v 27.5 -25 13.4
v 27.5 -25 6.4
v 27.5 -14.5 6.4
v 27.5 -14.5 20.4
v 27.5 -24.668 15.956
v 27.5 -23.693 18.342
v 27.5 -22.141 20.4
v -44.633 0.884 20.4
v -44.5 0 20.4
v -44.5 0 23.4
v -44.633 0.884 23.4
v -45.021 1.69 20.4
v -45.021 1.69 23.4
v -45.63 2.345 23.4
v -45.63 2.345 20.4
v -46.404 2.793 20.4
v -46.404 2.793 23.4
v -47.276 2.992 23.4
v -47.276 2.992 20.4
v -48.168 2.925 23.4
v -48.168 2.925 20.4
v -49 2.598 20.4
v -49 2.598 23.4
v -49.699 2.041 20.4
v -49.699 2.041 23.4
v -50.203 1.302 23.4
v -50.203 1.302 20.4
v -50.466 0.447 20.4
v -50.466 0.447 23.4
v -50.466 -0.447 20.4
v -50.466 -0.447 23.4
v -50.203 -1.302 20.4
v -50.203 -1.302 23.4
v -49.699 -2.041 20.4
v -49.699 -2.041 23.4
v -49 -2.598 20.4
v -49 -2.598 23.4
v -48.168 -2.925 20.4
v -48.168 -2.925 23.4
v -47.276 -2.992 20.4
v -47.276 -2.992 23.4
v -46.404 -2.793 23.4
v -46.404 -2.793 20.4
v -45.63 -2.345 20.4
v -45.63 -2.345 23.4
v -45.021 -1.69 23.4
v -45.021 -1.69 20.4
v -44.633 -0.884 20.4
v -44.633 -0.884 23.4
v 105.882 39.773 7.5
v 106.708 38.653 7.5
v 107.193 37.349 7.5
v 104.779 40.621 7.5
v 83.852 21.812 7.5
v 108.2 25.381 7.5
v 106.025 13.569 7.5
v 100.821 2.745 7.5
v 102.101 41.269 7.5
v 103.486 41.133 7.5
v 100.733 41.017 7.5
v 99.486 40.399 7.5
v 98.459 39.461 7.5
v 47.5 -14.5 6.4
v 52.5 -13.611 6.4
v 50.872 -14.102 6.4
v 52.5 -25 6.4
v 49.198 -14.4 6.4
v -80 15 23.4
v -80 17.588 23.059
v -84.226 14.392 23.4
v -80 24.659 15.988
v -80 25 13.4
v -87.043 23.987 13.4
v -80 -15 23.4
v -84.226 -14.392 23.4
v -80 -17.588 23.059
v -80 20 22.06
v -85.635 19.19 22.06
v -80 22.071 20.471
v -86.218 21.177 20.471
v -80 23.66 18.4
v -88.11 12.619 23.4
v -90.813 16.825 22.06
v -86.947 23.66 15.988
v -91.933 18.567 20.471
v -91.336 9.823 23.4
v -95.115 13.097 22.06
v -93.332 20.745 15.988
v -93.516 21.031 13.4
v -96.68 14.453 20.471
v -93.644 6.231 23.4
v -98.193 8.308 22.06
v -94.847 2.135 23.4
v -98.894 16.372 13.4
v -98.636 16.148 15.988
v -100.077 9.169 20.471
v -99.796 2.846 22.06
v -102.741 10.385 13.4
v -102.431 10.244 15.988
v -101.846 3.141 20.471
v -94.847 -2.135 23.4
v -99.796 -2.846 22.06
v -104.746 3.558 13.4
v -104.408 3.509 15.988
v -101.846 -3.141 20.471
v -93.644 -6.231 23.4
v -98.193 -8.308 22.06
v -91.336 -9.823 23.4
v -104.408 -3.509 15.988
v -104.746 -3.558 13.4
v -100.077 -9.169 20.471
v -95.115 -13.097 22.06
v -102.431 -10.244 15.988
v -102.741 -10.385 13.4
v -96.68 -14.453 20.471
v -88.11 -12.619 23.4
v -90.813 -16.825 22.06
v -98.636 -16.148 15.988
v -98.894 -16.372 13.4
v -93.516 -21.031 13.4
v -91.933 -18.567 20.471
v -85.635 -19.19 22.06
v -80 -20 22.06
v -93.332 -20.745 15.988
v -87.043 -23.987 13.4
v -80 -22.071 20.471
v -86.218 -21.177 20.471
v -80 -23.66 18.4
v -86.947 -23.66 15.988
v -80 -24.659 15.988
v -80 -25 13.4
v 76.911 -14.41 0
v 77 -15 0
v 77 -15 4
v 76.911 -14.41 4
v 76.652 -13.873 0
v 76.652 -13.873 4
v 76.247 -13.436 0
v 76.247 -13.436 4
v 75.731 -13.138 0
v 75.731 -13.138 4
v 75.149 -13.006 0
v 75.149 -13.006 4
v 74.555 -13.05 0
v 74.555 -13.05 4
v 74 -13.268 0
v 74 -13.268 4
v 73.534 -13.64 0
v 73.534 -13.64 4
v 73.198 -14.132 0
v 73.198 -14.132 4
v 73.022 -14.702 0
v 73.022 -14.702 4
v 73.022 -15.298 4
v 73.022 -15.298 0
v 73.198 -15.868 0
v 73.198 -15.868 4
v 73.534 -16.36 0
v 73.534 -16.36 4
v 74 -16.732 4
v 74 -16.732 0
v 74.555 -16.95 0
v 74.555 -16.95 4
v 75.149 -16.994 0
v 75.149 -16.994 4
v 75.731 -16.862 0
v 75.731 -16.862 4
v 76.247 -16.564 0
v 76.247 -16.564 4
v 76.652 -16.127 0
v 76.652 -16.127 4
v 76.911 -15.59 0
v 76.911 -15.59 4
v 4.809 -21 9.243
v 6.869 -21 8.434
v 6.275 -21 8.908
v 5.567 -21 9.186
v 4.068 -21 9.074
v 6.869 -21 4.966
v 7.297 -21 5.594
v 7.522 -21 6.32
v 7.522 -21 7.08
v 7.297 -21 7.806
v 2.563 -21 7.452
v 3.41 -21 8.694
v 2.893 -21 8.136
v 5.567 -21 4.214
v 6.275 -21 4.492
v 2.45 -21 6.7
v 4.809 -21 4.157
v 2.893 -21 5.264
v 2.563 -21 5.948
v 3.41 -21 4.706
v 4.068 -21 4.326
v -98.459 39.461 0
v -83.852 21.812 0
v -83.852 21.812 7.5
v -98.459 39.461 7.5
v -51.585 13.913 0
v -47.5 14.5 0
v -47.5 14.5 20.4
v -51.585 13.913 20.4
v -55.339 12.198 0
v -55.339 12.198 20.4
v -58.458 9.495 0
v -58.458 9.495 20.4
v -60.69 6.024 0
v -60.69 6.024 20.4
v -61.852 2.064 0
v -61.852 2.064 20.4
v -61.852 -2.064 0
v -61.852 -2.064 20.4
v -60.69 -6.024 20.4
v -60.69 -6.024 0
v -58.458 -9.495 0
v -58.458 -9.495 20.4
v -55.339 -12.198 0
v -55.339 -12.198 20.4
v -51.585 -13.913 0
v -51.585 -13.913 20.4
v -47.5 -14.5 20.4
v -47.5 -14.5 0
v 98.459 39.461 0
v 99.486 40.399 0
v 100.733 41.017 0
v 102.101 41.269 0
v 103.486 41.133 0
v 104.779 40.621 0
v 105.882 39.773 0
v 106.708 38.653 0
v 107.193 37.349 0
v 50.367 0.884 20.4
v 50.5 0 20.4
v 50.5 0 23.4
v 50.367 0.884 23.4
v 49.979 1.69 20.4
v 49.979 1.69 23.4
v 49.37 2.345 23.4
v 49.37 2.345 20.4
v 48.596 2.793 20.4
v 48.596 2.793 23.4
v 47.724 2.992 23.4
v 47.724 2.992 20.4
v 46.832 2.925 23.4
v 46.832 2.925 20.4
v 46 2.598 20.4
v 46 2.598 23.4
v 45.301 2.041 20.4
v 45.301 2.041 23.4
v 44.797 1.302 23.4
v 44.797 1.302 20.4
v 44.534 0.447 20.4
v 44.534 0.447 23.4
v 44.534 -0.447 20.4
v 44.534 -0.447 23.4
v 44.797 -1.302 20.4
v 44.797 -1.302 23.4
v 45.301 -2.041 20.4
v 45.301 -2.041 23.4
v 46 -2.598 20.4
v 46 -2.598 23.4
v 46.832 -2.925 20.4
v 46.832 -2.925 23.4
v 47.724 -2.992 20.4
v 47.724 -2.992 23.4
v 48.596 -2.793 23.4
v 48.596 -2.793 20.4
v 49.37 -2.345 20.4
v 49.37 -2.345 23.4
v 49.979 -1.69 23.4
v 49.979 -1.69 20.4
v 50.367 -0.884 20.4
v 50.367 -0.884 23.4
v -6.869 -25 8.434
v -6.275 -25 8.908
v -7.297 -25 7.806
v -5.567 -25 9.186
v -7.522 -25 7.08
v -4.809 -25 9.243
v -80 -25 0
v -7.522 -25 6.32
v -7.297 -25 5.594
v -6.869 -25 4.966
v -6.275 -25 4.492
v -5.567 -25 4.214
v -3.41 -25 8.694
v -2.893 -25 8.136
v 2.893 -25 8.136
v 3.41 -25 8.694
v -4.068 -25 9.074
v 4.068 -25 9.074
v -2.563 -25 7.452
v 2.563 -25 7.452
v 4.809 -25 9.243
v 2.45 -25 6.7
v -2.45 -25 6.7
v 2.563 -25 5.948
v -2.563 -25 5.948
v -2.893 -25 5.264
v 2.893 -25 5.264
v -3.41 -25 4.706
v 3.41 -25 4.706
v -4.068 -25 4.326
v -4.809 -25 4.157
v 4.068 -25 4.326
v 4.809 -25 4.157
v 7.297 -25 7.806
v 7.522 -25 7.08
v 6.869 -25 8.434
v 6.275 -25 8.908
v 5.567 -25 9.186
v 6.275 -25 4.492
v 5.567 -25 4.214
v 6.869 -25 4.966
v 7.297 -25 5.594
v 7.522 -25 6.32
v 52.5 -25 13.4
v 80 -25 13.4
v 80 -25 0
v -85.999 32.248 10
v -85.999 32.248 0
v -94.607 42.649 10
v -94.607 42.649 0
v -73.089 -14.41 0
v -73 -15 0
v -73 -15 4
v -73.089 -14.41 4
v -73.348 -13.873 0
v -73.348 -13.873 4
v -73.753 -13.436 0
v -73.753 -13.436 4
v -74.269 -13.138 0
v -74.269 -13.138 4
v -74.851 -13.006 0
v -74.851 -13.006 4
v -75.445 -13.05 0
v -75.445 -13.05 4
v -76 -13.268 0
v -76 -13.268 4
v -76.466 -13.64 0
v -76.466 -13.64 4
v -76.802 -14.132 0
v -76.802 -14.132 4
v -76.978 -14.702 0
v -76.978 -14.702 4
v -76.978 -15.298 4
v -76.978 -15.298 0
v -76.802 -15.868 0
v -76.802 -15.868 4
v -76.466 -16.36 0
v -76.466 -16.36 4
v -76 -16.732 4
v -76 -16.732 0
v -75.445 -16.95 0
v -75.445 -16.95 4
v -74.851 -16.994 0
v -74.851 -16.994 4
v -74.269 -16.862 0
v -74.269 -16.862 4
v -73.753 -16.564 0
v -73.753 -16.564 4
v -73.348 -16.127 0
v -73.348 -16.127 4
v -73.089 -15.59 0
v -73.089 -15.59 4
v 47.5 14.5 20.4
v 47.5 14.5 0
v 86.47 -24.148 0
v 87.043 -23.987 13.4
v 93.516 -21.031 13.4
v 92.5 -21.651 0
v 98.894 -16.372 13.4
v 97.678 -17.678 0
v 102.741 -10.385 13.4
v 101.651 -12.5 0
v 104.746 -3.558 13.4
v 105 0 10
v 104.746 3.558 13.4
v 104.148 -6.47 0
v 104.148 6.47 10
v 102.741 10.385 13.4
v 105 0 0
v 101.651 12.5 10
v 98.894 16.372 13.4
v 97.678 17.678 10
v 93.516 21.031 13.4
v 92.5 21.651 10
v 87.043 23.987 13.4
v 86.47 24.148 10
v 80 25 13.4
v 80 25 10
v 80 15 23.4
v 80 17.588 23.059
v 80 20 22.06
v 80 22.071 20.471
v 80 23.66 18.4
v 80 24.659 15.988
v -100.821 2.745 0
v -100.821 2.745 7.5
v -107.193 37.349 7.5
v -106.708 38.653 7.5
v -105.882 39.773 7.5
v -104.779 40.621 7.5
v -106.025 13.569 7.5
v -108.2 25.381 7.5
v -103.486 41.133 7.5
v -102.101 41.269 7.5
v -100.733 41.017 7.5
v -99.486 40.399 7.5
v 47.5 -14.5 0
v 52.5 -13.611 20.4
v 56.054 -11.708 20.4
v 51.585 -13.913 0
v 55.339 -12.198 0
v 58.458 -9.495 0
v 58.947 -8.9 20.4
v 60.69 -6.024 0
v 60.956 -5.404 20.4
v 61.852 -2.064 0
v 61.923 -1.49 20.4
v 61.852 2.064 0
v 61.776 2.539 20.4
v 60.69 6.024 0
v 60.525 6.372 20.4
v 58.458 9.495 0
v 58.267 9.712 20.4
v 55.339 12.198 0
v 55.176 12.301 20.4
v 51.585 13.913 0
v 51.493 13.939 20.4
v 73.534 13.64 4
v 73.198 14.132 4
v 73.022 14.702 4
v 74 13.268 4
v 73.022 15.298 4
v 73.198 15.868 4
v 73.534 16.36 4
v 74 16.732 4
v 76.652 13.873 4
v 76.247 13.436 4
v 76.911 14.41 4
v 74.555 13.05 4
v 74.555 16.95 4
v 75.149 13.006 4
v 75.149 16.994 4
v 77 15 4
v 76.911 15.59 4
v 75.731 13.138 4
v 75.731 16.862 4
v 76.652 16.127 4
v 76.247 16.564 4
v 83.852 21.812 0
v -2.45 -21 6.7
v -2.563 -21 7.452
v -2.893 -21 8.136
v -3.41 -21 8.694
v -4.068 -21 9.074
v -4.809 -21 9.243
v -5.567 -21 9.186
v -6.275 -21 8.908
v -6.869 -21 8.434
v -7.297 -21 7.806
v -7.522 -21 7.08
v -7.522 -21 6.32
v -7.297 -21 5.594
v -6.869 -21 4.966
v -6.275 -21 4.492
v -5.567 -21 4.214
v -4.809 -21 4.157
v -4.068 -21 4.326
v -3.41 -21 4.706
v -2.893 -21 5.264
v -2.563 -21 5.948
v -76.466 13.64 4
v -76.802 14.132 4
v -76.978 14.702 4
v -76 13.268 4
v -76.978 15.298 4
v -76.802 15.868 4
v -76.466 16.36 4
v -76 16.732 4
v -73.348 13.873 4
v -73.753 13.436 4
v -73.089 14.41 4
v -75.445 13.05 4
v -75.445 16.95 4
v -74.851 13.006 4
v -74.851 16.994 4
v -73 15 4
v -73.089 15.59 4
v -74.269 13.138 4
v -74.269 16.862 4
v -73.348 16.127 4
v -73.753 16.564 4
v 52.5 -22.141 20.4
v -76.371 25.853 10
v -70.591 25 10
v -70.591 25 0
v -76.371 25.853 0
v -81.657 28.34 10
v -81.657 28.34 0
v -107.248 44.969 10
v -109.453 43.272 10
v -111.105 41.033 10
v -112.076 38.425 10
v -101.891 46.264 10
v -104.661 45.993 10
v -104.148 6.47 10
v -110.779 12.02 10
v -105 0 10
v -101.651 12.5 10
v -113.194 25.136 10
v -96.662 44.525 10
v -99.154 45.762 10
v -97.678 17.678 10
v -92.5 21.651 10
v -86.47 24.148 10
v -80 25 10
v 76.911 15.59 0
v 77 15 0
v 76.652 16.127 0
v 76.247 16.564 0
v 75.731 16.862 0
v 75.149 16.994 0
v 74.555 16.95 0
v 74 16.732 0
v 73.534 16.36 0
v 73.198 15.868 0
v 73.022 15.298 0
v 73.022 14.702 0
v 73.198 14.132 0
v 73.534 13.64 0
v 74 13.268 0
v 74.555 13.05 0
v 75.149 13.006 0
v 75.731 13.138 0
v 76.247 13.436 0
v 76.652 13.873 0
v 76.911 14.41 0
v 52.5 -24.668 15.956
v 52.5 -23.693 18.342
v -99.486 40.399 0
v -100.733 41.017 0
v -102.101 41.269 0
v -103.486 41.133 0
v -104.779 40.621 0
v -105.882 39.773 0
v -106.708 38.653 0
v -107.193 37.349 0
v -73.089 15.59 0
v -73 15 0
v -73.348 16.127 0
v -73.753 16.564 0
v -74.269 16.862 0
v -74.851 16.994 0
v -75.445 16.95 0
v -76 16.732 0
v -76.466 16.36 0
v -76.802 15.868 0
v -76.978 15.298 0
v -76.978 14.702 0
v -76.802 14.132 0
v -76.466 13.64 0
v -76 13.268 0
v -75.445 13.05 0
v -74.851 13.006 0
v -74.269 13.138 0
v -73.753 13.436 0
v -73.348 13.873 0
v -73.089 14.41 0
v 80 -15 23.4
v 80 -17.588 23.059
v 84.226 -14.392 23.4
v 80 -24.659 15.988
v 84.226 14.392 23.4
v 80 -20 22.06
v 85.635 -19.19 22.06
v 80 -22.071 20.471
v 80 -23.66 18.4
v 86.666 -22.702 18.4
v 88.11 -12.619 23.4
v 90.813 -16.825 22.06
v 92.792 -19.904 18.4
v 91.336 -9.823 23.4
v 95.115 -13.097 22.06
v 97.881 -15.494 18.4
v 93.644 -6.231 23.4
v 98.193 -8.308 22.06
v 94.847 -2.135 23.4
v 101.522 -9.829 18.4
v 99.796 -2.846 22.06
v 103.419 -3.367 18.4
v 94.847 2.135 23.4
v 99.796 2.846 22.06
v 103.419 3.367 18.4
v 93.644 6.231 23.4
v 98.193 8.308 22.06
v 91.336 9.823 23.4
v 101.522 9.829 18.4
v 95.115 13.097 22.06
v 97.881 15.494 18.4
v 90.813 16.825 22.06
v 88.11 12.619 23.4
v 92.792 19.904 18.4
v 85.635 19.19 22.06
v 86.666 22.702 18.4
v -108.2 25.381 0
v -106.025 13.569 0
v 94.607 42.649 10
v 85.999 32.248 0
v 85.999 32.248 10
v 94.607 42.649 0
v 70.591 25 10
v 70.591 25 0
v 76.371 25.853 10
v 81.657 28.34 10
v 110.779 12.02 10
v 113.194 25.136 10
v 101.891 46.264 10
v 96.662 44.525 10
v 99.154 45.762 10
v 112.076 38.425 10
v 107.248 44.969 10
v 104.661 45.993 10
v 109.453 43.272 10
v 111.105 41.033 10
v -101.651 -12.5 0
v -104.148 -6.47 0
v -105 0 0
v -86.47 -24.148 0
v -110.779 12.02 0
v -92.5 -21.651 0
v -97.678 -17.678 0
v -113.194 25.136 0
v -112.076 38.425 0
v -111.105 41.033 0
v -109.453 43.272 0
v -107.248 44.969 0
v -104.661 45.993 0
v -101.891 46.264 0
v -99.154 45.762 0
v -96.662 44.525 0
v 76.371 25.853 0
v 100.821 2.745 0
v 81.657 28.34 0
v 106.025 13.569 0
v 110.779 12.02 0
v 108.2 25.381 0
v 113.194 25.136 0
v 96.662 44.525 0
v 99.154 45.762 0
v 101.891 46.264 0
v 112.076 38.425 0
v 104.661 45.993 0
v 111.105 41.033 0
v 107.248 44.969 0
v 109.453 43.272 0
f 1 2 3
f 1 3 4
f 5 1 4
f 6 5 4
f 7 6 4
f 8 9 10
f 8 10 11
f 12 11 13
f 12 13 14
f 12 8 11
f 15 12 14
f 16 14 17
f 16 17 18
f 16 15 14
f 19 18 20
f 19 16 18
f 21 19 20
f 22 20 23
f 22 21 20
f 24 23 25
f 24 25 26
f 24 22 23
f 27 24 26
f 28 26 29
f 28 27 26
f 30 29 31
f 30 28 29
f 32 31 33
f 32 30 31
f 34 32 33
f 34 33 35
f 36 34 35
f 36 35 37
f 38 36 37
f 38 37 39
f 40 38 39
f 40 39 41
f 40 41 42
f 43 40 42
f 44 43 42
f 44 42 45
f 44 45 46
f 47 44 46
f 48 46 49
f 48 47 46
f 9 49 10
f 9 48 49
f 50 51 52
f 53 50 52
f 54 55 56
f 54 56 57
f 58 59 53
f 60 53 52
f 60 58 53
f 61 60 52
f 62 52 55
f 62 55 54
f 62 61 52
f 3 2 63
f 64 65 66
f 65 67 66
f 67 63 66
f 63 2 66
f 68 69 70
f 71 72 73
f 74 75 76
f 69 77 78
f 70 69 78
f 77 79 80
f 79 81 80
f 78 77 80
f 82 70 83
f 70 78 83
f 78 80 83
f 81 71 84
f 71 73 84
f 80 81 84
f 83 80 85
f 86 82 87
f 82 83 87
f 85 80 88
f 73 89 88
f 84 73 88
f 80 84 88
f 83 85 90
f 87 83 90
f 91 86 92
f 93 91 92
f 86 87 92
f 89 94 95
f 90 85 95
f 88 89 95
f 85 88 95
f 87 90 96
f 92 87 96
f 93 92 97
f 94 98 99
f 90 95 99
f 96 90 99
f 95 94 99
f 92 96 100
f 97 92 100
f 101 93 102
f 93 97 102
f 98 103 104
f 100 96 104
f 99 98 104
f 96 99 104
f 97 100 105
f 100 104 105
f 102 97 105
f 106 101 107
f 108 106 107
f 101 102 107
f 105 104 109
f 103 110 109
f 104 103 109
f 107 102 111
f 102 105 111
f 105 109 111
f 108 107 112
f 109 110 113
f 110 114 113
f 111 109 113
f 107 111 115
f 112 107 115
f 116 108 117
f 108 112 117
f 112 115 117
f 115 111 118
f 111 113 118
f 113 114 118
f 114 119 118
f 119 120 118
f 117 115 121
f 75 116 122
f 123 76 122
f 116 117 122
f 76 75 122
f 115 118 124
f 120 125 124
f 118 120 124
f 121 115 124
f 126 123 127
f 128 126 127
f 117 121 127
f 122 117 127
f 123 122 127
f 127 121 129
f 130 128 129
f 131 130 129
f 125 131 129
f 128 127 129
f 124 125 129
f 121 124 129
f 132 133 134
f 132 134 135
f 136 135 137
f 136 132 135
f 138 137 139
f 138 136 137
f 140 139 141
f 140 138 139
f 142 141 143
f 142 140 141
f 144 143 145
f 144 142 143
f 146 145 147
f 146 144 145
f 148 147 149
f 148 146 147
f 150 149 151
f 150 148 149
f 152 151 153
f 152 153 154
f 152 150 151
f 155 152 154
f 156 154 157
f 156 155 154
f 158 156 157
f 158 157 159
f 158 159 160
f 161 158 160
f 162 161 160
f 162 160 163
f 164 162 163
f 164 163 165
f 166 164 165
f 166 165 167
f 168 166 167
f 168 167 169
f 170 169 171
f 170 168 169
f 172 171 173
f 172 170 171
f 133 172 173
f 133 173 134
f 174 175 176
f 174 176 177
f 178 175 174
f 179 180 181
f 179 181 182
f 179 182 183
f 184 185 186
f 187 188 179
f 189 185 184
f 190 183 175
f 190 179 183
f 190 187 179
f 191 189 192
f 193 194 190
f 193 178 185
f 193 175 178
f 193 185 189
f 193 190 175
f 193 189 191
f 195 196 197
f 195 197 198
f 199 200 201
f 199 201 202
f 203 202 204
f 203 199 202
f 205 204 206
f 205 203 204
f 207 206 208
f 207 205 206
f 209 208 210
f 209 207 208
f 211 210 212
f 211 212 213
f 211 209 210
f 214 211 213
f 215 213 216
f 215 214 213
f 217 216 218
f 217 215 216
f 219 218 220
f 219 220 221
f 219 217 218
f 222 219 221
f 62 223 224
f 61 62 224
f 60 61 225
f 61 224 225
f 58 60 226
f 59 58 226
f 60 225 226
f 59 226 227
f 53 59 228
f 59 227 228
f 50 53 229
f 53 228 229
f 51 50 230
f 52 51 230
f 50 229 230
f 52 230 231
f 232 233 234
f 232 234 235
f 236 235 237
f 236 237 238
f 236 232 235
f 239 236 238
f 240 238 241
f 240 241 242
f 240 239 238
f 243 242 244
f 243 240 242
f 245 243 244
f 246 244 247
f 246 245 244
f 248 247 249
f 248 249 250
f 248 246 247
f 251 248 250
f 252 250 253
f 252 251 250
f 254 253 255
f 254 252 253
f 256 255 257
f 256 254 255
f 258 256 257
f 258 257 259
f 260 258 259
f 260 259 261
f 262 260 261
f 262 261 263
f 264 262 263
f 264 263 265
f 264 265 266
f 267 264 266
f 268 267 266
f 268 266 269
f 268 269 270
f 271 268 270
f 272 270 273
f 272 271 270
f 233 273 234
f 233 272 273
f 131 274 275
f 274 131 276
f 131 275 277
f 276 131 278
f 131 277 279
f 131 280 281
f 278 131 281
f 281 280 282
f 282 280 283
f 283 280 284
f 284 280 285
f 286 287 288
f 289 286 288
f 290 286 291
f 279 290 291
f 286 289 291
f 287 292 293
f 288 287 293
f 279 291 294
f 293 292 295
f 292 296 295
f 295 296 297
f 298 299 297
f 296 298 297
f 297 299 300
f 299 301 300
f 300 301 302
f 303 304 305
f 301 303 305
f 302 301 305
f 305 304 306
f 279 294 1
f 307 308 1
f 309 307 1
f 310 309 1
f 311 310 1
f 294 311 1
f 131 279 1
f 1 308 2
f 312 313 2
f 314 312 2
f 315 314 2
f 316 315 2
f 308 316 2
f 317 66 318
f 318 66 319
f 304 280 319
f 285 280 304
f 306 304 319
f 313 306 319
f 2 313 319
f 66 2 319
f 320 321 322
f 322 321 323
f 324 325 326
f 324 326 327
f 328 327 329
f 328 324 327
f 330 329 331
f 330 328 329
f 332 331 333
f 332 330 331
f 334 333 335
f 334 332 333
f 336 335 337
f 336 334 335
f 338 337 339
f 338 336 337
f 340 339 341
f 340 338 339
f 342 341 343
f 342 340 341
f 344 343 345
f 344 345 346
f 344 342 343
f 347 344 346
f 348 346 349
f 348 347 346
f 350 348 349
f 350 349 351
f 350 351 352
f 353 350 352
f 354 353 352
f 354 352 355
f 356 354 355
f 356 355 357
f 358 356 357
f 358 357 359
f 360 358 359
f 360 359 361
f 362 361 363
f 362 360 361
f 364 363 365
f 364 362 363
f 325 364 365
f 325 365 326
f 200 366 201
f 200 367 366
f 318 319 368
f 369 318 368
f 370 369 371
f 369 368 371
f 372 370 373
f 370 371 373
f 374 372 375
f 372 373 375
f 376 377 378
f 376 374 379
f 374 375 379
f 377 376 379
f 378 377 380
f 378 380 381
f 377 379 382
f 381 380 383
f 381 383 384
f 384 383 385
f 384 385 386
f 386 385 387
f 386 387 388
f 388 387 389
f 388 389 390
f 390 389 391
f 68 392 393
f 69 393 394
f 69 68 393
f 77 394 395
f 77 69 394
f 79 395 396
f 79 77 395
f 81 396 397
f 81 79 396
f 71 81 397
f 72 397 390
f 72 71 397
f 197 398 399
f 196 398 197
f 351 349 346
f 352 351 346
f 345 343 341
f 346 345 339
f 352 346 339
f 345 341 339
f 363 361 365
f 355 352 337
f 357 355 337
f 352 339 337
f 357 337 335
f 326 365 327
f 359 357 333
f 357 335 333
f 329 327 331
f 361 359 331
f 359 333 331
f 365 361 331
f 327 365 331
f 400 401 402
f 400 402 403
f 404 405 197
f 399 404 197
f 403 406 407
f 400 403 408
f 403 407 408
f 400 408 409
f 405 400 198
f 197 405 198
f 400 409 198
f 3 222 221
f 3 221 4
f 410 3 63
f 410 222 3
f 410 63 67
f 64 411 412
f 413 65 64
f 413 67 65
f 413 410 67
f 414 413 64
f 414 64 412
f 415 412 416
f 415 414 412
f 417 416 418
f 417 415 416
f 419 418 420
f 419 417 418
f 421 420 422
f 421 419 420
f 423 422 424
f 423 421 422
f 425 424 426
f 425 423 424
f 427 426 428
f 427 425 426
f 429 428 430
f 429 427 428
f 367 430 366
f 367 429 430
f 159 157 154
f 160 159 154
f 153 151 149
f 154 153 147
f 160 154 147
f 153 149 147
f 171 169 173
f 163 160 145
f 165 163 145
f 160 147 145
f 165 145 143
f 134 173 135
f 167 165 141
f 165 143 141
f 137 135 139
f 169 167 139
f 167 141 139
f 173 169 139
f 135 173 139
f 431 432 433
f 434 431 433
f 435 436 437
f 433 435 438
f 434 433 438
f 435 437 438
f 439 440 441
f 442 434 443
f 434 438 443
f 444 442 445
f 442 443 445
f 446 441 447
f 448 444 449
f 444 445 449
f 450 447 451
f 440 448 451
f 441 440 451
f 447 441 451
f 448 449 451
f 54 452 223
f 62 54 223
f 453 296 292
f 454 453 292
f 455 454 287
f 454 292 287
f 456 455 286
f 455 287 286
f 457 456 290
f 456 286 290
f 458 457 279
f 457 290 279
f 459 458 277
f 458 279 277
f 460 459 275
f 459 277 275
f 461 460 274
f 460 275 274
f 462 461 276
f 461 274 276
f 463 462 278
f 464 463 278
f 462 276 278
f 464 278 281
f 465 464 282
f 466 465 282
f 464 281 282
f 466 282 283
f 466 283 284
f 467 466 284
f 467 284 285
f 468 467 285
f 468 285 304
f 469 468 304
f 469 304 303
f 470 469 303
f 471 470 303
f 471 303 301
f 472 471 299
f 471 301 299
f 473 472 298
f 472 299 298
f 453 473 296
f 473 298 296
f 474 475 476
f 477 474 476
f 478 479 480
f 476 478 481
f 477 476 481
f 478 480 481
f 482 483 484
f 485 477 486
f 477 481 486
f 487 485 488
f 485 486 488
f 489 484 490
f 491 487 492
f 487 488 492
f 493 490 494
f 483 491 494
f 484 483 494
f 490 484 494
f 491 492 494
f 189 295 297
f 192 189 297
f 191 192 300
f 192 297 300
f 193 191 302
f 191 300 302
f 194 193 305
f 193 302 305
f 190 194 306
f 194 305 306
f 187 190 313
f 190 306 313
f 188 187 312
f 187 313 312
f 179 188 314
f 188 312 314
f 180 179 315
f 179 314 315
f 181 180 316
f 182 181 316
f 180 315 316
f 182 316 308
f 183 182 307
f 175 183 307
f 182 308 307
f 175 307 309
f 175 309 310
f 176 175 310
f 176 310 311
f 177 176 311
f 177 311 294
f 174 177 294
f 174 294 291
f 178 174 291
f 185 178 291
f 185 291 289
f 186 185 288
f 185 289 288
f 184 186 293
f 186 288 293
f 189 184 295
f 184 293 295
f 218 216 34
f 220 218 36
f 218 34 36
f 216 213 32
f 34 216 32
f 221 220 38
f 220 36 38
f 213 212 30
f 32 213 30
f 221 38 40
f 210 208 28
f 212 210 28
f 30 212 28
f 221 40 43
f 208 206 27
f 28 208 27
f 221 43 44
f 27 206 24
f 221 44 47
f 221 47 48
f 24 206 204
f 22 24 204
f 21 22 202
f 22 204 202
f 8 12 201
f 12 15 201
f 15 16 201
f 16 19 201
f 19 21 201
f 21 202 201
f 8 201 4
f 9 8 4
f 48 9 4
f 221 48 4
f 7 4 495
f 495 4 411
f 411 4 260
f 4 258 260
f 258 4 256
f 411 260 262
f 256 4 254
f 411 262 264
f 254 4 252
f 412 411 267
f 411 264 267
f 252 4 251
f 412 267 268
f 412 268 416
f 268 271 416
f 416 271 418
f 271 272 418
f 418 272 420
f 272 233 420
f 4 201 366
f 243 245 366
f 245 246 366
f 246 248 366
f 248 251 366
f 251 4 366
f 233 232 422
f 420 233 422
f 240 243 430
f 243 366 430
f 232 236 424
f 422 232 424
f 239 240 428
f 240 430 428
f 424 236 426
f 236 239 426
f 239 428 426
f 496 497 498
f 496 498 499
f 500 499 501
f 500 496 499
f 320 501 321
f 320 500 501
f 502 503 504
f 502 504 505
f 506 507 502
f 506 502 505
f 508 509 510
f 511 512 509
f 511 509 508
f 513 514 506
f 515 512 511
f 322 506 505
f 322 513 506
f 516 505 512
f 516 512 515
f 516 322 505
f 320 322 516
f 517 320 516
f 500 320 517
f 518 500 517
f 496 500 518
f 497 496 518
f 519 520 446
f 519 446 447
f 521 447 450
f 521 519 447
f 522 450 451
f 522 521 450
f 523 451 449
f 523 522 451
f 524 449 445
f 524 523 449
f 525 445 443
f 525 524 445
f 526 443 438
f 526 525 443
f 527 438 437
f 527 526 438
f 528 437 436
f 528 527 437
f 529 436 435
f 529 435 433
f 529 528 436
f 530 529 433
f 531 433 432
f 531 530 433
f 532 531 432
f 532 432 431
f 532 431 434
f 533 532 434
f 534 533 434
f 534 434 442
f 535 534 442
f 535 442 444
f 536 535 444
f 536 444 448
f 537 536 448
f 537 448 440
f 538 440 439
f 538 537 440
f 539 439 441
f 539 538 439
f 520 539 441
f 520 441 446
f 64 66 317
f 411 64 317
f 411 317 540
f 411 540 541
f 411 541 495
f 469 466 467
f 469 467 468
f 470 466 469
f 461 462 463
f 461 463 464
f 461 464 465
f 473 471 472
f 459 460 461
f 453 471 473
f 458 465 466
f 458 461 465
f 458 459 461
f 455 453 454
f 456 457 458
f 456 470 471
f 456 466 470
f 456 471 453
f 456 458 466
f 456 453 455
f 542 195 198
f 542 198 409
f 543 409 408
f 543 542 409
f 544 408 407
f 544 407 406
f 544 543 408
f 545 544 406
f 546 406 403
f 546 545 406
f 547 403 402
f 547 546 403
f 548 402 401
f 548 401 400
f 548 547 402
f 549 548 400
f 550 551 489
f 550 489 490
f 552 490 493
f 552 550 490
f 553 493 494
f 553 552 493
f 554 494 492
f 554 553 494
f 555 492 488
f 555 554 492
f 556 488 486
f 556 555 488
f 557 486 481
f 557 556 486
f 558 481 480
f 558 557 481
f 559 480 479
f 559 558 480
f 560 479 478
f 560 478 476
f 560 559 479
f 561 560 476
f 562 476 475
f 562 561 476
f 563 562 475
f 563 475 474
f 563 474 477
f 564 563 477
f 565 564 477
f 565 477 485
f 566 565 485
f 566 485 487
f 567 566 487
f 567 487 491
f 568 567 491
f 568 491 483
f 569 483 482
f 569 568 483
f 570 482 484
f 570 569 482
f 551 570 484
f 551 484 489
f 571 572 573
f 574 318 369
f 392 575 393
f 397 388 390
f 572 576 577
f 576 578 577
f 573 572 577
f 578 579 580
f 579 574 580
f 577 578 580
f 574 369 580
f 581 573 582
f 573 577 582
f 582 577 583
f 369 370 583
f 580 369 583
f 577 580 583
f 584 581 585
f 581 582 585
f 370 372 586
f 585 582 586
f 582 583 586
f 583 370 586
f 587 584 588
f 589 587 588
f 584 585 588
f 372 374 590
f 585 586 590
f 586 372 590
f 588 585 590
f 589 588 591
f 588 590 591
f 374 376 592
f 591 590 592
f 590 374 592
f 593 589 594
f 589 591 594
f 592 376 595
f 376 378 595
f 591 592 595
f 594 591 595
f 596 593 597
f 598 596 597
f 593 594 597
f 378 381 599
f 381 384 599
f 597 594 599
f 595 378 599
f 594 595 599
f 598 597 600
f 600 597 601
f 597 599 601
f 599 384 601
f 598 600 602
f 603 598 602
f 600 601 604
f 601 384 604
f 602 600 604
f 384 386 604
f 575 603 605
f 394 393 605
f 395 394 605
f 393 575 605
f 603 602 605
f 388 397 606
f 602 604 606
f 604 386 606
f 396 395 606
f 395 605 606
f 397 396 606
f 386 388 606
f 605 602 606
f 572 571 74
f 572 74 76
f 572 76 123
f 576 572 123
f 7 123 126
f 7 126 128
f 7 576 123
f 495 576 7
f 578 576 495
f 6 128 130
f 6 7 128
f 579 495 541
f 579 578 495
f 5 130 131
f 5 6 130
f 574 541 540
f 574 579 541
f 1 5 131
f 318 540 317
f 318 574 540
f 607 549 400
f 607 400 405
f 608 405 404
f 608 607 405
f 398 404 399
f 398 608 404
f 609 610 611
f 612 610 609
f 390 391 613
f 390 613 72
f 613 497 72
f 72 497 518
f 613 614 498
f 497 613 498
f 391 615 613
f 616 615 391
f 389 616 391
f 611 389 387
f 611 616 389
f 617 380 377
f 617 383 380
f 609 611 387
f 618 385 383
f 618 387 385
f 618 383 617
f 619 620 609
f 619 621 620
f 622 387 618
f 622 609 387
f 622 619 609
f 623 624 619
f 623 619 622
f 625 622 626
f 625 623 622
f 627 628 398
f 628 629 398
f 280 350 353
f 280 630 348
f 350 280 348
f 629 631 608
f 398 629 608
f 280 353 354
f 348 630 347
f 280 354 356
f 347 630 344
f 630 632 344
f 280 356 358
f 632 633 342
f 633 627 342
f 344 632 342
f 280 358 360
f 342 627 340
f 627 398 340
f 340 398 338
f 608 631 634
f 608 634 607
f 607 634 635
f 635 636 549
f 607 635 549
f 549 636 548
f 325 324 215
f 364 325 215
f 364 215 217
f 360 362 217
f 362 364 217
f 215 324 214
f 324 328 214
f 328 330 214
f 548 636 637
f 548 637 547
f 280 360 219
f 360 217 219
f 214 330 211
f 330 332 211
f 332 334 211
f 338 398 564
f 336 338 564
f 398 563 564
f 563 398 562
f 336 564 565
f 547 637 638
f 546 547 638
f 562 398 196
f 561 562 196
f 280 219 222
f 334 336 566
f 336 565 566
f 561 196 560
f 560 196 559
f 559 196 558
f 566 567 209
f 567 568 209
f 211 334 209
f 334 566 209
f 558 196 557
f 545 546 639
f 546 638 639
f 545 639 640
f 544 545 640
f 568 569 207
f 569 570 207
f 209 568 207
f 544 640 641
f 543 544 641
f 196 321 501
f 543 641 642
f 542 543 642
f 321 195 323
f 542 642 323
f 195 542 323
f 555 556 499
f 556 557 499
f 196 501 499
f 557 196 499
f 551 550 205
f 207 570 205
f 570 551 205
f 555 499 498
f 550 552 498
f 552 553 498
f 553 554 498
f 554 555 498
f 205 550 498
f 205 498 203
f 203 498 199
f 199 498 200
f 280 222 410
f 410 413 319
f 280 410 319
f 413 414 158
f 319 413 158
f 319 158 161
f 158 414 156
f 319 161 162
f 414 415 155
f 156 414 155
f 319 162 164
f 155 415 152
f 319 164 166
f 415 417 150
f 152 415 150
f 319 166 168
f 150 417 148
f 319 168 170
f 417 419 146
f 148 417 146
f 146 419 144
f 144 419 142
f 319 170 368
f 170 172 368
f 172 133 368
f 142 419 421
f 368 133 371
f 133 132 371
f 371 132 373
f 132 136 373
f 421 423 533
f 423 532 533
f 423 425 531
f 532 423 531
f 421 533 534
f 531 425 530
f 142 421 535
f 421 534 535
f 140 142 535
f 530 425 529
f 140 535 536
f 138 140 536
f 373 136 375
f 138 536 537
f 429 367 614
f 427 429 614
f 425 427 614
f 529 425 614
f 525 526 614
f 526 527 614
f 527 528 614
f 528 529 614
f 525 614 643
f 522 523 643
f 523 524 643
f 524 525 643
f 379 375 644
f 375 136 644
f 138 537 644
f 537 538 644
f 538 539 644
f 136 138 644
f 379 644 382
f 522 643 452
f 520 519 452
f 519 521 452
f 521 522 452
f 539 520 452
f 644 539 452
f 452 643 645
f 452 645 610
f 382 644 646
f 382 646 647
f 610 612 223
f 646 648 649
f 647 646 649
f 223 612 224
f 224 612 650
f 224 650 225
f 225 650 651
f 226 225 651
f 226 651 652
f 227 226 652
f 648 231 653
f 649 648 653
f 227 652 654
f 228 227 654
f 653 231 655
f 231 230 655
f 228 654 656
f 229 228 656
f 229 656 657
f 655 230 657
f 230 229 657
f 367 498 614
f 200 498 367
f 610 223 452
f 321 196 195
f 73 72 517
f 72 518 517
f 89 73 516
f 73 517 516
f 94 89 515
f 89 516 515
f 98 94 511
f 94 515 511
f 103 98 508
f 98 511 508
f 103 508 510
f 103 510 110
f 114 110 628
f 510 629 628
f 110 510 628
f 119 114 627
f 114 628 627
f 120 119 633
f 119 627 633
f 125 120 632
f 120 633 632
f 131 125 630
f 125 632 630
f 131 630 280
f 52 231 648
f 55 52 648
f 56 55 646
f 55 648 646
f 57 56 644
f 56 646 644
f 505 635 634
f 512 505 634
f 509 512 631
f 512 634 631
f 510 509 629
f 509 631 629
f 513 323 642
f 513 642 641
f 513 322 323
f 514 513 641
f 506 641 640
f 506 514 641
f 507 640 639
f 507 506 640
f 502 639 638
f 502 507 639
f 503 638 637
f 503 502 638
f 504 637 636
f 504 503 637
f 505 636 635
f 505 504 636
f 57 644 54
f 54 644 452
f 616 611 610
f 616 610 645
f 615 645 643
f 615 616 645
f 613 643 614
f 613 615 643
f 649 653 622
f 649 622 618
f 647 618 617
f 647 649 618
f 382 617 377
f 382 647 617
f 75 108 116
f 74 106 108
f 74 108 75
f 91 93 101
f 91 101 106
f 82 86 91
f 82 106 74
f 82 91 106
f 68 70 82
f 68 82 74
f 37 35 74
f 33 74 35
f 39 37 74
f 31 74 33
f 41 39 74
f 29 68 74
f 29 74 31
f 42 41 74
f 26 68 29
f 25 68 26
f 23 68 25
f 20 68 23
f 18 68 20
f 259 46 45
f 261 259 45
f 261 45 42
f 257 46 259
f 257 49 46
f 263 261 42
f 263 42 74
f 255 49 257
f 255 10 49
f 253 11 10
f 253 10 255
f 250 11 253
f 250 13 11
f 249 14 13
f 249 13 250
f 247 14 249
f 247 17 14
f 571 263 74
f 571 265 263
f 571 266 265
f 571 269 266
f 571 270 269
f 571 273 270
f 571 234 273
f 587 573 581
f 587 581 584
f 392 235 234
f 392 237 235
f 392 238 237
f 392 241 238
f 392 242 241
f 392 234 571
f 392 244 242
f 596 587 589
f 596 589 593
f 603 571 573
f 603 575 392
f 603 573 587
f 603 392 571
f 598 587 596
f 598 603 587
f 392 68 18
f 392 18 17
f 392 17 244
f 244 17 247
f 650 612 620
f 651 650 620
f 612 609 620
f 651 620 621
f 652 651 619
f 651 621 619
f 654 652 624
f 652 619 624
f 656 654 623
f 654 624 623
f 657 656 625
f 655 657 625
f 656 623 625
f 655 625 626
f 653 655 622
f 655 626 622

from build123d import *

# Parameters (mm, degrees)
SKETCH1_R           = 2
BOSS_EXTRUDE1_DEPTH = 4
BOSS_EXTRUDE2_DEPTH = 16.4
SKETCH3_R           = 3
BOSS_EXTRUDE3_DEPTH = 3
FILLET1_R           = 10
BOSS_EXTRUDE4_DEPTH = 10
FILLET3_R           = 10
CUT_EXTRUDE3_DEPTH  = 7.5
SKETCH9_W           = 25
SKETCH9_H           = 14
CUT_EXTRUDE4_DEPTH  = 15
FILLET4_R           = 20
SKETCH10_R          = 2.55
CUT_EXTRUDE5_DEPTH  = 4


with BuildPart() as part:
    # Sketch1 → Boss-Extrude1 (new body)
    with BuildSketch(Plane.XY):
        with BuildLine():
            Line((80, -25), (-80, -25))
            ThreePointArc((-80, -25), (-105, 0), (-80, 25))
            Line((-80, 25), (80, 25))
            ThreePointArc((80, 25), (105, 0), (80, -25))
        make_face()
        with Locations((75, -15)):
            Circle(SKETCH1_R, mode=Mode.SUBTRACT)
        with Locations((75, 15)):
            Circle(SKETCH1_R, mode=Mode.SUBTRACT)
        with Locations((-75, -15)):
            Circle(SKETCH1_R, mode=Mode.SUBTRACT)
        with Locations((-75, 15)):
            Circle(SKETCH1_R, mode=Mode.SUBTRACT)
        with BuildLine():
            Line((47.5, -14.5), (-47.5, -14.5))
            ThreePointArc((-47.5, -14.5), (-62, 0), (-47.5, 14.5))
            Line((-47.5, 14.5), (47.5, 14.5))
            ThreePointArc((47.5, 14.5), (62, 0), (47.5, -14.5))
        make_face(mode=Mode.SUBTRACT)
    extrude(amount=BOSS_EXTRUDE1_DEPTH)

    # Sketch2 → Boss-Extrude2 (add)
    with BuildSketch(Plane.XY.offset(4)):
        with BuildLine():
            Line((80, 25), (-80, 25))
            ThreePointArc((-80, 25), (-105, 0), (-80, -25))
            Line((-80, -25), (80, -25))
            ThreePointArc((80, -25), (105, 0), (80, 25))
        make_face()
        with BuildLine():
            Line((47.5, 14.5), (-47.5, 14.5))
            ThreePointArc((-47.5, 14.5), (-62, 0), (-47.5, -14.5))
            Line((-47.5, -14.5), (47.5, -14.5))
            ThreePointArc((47.5, -14.5), (62, 0), (47.5, 14.5))
        make_face(mode=Mode.SUBTRACT)
    extrude(amount=BOSS_EXTRUDE2_DEPTH)

    # Sketch3 → Boss-Extrude3 (add)
    with BuildSketch(Plane.XY.offset(20.4)):
        with BuildLine():
            Line((80, 25), (-80, 25))
            ThreePointArc((-80, 25), (-105, 0), (-80, -25))
            Line((-80, -25), (80, -25))
            ThreePointArc((80, -25), (105, 0), (80, 25))
        make_face()
        with Locations((-47.5, 0)):
            Circle(SKETCH3_R, mode=Mode.SUBTRACT)
        with Locations((47.5, 0)):
            Circle(SKETCH3_R, mode=Mode.SUBTRACT)
    extrude(amount=BOSS_EXTRUDE3_DEPTH)

    # Fillet1
    fillet1_edges = [part.edges().sort_by_distance(p)[0] for p in [
        (105, 0, 23.4),
        (0, 25, 23.4),
        (-105, 0, 23.4),
        (0, -25, 23.4),
    ]]
    fillet(fillet1_edges, radius=FILLET1_R)

    # Sketch4 → Boss-Extrude4 (add)
    with BuildSketch(Plane(origin=(0, 0, 0), x_dir=(-1, 0, 0), z_dir=(0, 0, -1))):
        with BuildLine():
            Line((80, 25), (105, 55.206564225))
            ThreePointArc((105, 55.206564225), (113.254710442, 27.603282112), (105, 0))
            ThreePointArc((105, 0), (97.67766953, 17.67766953), (80, 25))
        make_face()
        with BuildLine():
            Line((-80, 25), (-105, 55.206564225))
            ThreePointArc((-105, 55.206564225), (-113.254710442, 27.603282112), (-105, 0))
            ThreePointArc((-105, 0), (-97.67766953, 17.67766953), (-80, 25))
        make_face()
    extrude(amount=-BOSS_EXTRUDE4_DEPTH)

    # Fillet3
    fillet3_edges = [part.edges().sort_by_distance(p)[0] for p in [
        (105, 55.206564225, 5),
        (-105, 55.206564225, 5),
    ]]
    fillet(fillet3_edges, radius=FILLET3_R)

    # Sketch8 → Cut-Extrude3 (cut)
    with BuildSketch(Plane(origin=(0, 0, 0), x_dir=(-1, 0, 0), z_dir=(0, 0, -1))):
        with BuildLine():
            Line((-100.820886267, 2.744996978), (-83.851879902, 21.812050625))
            Line((-83.851879902, 21.812050625), (-98.458728042, 39.460958483))
            ThreePointArc((-98.458728042, 39.460958483), (-103.485584806, 41.132991554), (-107.19341332, 37.349211536))
            ThreePointArc((-107.19341332, 37.349211536), (-107.505926341, 19.402788283), (-100.820886267, 2.744996978))
        make_face()
        with BuildLine():
            Line((83.851879902, 21.812050625), (98.458728042, 39.460958483))
            ThreePointArc((98.458728042, 39.460958483), (103.485584806, 41.132991554), (107.19341332, 37.349211536))
            ThreePointArc((107.19341332, 37.349211536), (107.505926341, 19.402788283), (100.820886267, 2.744996978))
            Line((100.820886267, 2.744996978), (83.851879902, 21.812050625))
        make_face()
    extrude(amount=-CUT_EXTRUDE3_DEPTH, mode=Mode.SUBTRACT)

    # Sketch9 → Cut-Extrude4 (cut)
    with BuildSketch(Plane.XZ.offset(25)):
        with Locations((40, 13.4)):
            Rectangle(SKETCH9_W, SKETCH9_H)
    extrude(amount=-CUT_EXTRUDE4_DEPTH, mode=Mode.SUBTRACT)

    # Fillet4
    # the kernel refuses this fillet: 20 mm, written as the material it adds along each edge
    with BuildSketch(Plane(origin=(80, 25, 10), x_dir=(-1, 0, 0), z_dir=(0, 0, -1)), Plane(origin=(-80, 25, 10), x_dir=(-0.6375898750759507, 0.7703759804151696, 0), z_dir=(0, 0, -1))) as fillet4_piece_1:
        with BuildLine():
            CenterArc((FILLET4_R * 0.470432794035, FILLET4_R), FILLET4_R, 219.612336421, 50.387663579)
            Line((-FILLET4_R * 0.29994318638, FILLET4_R * 0.362410124924), (0, 0))
            Line((0, 0), (FILLET4_R * 0.470432794035, 0))
        make_face()
    extrude(amount=10)

    # Sketch10 → Cut-Extrude5 (cut)
    with BuildSketch(Plane.XZ.offset(25)):
        with Locations((-5, 6.7)):
            Circle(SKETCH10_R)
        with Locations(Location((5, 6.7, 0), (0, 0, 180))):
            Circle(SKETCH10_R)
    extrude(amount=-CUT_EXTRUDE5_DEPTH, mode=Mode.SUBTRACT)


solid = part.part
